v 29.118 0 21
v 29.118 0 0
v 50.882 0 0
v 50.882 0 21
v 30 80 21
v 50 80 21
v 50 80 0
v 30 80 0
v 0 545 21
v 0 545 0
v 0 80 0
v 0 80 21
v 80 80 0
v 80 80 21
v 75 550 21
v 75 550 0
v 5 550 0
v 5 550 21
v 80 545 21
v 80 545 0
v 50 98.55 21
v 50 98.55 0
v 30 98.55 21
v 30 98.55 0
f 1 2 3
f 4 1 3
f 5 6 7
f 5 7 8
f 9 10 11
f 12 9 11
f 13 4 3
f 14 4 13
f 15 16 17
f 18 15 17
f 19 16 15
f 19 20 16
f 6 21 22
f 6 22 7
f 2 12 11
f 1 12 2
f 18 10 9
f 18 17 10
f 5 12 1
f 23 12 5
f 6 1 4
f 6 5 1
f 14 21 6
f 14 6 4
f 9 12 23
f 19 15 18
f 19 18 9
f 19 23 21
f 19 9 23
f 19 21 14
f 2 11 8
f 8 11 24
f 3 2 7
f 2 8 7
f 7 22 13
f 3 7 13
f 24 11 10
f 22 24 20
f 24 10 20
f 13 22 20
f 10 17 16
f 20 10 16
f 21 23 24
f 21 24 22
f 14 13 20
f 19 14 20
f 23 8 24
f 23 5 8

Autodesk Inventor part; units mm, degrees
ref_plane "YZ Plane" through (0, 0, 0) normal (1, 0, 0) x (0, 1, 0)
ref_plane "XZ Plane" through (0, 0, 0) normal (0, 1, 0) x (-1, 0, 0)
ref_plane "XY Plane" through (0, 0, 0) normal (0, 0, 1) x (1, 0, 0)
sketch "Esquisse1" plane through (0, 0, 0) normal (0, 0, 1) x (1, 0, 0)
  line L0 (0, 0) -> (80, 0)
  line L1 (80, 0) -> (80, 550)
  line L2 (80, 550) -> (0, 550)
  line L3 (0, 550) -> (0, 0)
  dimension "d0" = 80
  dimension "d1" = 550
extrude "Extrusion1" add sketch "Esquisse1" along normal blind 21
chamfer "Chanfrein1" distance 5 angle 45 2 edges at (0, 550, 10.5) (80, 550, 10.5)
sketch "Esquisse4" plane through (0, 0, 21) normal (0, 0, 1) x (1, 0, 0)
  line L0 (0, 545) -> (0, 0) projected
  line L1 (80, 0) -> (80, 545) projected
  line L2 (0, 80) -> (29.1176, 0)
  line L3 (0, 0) -> (80, 0) projected
  line L4 (50.8824, 0) -> (80, 80)
  line L5 (29.1176, 0) -> (50.8824, 0)
  line L6 (30, 98.55) -> (50, 98.55)
  line L7 (50, 98.55) -> (50, 80)
  line L8 (50, 80) -> (30, 80)
  line L9 (30, 80) -> (30, 98.55)
  line L10 (40, 0) -> (40, 80) construction
  dimension "d23" = 70
  dimension "d24" = 70
  dimension "d25" = 80
  dimension "d26" = 20
  dimension "d27" = 18.55
extrude "Extrusion3" cut sketch "Esquisse4" against normal blind 21
sketch "Esquisse6" plane through (0, 0, 21) normal (0, 0, 1) x (1, 0, 0)
  line L0 (75, 550) -> (5, 550) construction
  line L1 (35, 520) -> (35, 545)
  line L2 (0, 545) -> (0, 80) construction
  line L3 (0, 535) -> (35, 535) construction
  line L4 (45, 535) -> (80, 535) construction
  line L5 (80, 80) -> (80, 545) construction
  line L6 (25, 270) -> (25, 520)
  line L7 (25, 520) -> (35, 520)
  line L8 (25, 395) -> (0, 395) construction
  line L9 (55, 395) -> (80, 395) construction
  line L10 (40, 550) -> (40, 270) construction
  line L11 (25, 270) -> (40, 270)
  line L12 (40, 270) -> (40, 550)
  line L13 (35, 545) -> (25, 545)
  line L14 (25, 545) -> (25, 550)
  line L15 (25, 550) -> (40, 550)
  point P0 (0, 0)
  point P1 (35, 550)
  dimension "d39" = 5
  dimension "d41" = 30
  dimension "d42" = 250
  dimension "d43" = 15
  dimension "d45" = 5
  dimension "d46" = 15
revolve "Révolution1" [suppressed]
properties part number "graduated_foot_03"
